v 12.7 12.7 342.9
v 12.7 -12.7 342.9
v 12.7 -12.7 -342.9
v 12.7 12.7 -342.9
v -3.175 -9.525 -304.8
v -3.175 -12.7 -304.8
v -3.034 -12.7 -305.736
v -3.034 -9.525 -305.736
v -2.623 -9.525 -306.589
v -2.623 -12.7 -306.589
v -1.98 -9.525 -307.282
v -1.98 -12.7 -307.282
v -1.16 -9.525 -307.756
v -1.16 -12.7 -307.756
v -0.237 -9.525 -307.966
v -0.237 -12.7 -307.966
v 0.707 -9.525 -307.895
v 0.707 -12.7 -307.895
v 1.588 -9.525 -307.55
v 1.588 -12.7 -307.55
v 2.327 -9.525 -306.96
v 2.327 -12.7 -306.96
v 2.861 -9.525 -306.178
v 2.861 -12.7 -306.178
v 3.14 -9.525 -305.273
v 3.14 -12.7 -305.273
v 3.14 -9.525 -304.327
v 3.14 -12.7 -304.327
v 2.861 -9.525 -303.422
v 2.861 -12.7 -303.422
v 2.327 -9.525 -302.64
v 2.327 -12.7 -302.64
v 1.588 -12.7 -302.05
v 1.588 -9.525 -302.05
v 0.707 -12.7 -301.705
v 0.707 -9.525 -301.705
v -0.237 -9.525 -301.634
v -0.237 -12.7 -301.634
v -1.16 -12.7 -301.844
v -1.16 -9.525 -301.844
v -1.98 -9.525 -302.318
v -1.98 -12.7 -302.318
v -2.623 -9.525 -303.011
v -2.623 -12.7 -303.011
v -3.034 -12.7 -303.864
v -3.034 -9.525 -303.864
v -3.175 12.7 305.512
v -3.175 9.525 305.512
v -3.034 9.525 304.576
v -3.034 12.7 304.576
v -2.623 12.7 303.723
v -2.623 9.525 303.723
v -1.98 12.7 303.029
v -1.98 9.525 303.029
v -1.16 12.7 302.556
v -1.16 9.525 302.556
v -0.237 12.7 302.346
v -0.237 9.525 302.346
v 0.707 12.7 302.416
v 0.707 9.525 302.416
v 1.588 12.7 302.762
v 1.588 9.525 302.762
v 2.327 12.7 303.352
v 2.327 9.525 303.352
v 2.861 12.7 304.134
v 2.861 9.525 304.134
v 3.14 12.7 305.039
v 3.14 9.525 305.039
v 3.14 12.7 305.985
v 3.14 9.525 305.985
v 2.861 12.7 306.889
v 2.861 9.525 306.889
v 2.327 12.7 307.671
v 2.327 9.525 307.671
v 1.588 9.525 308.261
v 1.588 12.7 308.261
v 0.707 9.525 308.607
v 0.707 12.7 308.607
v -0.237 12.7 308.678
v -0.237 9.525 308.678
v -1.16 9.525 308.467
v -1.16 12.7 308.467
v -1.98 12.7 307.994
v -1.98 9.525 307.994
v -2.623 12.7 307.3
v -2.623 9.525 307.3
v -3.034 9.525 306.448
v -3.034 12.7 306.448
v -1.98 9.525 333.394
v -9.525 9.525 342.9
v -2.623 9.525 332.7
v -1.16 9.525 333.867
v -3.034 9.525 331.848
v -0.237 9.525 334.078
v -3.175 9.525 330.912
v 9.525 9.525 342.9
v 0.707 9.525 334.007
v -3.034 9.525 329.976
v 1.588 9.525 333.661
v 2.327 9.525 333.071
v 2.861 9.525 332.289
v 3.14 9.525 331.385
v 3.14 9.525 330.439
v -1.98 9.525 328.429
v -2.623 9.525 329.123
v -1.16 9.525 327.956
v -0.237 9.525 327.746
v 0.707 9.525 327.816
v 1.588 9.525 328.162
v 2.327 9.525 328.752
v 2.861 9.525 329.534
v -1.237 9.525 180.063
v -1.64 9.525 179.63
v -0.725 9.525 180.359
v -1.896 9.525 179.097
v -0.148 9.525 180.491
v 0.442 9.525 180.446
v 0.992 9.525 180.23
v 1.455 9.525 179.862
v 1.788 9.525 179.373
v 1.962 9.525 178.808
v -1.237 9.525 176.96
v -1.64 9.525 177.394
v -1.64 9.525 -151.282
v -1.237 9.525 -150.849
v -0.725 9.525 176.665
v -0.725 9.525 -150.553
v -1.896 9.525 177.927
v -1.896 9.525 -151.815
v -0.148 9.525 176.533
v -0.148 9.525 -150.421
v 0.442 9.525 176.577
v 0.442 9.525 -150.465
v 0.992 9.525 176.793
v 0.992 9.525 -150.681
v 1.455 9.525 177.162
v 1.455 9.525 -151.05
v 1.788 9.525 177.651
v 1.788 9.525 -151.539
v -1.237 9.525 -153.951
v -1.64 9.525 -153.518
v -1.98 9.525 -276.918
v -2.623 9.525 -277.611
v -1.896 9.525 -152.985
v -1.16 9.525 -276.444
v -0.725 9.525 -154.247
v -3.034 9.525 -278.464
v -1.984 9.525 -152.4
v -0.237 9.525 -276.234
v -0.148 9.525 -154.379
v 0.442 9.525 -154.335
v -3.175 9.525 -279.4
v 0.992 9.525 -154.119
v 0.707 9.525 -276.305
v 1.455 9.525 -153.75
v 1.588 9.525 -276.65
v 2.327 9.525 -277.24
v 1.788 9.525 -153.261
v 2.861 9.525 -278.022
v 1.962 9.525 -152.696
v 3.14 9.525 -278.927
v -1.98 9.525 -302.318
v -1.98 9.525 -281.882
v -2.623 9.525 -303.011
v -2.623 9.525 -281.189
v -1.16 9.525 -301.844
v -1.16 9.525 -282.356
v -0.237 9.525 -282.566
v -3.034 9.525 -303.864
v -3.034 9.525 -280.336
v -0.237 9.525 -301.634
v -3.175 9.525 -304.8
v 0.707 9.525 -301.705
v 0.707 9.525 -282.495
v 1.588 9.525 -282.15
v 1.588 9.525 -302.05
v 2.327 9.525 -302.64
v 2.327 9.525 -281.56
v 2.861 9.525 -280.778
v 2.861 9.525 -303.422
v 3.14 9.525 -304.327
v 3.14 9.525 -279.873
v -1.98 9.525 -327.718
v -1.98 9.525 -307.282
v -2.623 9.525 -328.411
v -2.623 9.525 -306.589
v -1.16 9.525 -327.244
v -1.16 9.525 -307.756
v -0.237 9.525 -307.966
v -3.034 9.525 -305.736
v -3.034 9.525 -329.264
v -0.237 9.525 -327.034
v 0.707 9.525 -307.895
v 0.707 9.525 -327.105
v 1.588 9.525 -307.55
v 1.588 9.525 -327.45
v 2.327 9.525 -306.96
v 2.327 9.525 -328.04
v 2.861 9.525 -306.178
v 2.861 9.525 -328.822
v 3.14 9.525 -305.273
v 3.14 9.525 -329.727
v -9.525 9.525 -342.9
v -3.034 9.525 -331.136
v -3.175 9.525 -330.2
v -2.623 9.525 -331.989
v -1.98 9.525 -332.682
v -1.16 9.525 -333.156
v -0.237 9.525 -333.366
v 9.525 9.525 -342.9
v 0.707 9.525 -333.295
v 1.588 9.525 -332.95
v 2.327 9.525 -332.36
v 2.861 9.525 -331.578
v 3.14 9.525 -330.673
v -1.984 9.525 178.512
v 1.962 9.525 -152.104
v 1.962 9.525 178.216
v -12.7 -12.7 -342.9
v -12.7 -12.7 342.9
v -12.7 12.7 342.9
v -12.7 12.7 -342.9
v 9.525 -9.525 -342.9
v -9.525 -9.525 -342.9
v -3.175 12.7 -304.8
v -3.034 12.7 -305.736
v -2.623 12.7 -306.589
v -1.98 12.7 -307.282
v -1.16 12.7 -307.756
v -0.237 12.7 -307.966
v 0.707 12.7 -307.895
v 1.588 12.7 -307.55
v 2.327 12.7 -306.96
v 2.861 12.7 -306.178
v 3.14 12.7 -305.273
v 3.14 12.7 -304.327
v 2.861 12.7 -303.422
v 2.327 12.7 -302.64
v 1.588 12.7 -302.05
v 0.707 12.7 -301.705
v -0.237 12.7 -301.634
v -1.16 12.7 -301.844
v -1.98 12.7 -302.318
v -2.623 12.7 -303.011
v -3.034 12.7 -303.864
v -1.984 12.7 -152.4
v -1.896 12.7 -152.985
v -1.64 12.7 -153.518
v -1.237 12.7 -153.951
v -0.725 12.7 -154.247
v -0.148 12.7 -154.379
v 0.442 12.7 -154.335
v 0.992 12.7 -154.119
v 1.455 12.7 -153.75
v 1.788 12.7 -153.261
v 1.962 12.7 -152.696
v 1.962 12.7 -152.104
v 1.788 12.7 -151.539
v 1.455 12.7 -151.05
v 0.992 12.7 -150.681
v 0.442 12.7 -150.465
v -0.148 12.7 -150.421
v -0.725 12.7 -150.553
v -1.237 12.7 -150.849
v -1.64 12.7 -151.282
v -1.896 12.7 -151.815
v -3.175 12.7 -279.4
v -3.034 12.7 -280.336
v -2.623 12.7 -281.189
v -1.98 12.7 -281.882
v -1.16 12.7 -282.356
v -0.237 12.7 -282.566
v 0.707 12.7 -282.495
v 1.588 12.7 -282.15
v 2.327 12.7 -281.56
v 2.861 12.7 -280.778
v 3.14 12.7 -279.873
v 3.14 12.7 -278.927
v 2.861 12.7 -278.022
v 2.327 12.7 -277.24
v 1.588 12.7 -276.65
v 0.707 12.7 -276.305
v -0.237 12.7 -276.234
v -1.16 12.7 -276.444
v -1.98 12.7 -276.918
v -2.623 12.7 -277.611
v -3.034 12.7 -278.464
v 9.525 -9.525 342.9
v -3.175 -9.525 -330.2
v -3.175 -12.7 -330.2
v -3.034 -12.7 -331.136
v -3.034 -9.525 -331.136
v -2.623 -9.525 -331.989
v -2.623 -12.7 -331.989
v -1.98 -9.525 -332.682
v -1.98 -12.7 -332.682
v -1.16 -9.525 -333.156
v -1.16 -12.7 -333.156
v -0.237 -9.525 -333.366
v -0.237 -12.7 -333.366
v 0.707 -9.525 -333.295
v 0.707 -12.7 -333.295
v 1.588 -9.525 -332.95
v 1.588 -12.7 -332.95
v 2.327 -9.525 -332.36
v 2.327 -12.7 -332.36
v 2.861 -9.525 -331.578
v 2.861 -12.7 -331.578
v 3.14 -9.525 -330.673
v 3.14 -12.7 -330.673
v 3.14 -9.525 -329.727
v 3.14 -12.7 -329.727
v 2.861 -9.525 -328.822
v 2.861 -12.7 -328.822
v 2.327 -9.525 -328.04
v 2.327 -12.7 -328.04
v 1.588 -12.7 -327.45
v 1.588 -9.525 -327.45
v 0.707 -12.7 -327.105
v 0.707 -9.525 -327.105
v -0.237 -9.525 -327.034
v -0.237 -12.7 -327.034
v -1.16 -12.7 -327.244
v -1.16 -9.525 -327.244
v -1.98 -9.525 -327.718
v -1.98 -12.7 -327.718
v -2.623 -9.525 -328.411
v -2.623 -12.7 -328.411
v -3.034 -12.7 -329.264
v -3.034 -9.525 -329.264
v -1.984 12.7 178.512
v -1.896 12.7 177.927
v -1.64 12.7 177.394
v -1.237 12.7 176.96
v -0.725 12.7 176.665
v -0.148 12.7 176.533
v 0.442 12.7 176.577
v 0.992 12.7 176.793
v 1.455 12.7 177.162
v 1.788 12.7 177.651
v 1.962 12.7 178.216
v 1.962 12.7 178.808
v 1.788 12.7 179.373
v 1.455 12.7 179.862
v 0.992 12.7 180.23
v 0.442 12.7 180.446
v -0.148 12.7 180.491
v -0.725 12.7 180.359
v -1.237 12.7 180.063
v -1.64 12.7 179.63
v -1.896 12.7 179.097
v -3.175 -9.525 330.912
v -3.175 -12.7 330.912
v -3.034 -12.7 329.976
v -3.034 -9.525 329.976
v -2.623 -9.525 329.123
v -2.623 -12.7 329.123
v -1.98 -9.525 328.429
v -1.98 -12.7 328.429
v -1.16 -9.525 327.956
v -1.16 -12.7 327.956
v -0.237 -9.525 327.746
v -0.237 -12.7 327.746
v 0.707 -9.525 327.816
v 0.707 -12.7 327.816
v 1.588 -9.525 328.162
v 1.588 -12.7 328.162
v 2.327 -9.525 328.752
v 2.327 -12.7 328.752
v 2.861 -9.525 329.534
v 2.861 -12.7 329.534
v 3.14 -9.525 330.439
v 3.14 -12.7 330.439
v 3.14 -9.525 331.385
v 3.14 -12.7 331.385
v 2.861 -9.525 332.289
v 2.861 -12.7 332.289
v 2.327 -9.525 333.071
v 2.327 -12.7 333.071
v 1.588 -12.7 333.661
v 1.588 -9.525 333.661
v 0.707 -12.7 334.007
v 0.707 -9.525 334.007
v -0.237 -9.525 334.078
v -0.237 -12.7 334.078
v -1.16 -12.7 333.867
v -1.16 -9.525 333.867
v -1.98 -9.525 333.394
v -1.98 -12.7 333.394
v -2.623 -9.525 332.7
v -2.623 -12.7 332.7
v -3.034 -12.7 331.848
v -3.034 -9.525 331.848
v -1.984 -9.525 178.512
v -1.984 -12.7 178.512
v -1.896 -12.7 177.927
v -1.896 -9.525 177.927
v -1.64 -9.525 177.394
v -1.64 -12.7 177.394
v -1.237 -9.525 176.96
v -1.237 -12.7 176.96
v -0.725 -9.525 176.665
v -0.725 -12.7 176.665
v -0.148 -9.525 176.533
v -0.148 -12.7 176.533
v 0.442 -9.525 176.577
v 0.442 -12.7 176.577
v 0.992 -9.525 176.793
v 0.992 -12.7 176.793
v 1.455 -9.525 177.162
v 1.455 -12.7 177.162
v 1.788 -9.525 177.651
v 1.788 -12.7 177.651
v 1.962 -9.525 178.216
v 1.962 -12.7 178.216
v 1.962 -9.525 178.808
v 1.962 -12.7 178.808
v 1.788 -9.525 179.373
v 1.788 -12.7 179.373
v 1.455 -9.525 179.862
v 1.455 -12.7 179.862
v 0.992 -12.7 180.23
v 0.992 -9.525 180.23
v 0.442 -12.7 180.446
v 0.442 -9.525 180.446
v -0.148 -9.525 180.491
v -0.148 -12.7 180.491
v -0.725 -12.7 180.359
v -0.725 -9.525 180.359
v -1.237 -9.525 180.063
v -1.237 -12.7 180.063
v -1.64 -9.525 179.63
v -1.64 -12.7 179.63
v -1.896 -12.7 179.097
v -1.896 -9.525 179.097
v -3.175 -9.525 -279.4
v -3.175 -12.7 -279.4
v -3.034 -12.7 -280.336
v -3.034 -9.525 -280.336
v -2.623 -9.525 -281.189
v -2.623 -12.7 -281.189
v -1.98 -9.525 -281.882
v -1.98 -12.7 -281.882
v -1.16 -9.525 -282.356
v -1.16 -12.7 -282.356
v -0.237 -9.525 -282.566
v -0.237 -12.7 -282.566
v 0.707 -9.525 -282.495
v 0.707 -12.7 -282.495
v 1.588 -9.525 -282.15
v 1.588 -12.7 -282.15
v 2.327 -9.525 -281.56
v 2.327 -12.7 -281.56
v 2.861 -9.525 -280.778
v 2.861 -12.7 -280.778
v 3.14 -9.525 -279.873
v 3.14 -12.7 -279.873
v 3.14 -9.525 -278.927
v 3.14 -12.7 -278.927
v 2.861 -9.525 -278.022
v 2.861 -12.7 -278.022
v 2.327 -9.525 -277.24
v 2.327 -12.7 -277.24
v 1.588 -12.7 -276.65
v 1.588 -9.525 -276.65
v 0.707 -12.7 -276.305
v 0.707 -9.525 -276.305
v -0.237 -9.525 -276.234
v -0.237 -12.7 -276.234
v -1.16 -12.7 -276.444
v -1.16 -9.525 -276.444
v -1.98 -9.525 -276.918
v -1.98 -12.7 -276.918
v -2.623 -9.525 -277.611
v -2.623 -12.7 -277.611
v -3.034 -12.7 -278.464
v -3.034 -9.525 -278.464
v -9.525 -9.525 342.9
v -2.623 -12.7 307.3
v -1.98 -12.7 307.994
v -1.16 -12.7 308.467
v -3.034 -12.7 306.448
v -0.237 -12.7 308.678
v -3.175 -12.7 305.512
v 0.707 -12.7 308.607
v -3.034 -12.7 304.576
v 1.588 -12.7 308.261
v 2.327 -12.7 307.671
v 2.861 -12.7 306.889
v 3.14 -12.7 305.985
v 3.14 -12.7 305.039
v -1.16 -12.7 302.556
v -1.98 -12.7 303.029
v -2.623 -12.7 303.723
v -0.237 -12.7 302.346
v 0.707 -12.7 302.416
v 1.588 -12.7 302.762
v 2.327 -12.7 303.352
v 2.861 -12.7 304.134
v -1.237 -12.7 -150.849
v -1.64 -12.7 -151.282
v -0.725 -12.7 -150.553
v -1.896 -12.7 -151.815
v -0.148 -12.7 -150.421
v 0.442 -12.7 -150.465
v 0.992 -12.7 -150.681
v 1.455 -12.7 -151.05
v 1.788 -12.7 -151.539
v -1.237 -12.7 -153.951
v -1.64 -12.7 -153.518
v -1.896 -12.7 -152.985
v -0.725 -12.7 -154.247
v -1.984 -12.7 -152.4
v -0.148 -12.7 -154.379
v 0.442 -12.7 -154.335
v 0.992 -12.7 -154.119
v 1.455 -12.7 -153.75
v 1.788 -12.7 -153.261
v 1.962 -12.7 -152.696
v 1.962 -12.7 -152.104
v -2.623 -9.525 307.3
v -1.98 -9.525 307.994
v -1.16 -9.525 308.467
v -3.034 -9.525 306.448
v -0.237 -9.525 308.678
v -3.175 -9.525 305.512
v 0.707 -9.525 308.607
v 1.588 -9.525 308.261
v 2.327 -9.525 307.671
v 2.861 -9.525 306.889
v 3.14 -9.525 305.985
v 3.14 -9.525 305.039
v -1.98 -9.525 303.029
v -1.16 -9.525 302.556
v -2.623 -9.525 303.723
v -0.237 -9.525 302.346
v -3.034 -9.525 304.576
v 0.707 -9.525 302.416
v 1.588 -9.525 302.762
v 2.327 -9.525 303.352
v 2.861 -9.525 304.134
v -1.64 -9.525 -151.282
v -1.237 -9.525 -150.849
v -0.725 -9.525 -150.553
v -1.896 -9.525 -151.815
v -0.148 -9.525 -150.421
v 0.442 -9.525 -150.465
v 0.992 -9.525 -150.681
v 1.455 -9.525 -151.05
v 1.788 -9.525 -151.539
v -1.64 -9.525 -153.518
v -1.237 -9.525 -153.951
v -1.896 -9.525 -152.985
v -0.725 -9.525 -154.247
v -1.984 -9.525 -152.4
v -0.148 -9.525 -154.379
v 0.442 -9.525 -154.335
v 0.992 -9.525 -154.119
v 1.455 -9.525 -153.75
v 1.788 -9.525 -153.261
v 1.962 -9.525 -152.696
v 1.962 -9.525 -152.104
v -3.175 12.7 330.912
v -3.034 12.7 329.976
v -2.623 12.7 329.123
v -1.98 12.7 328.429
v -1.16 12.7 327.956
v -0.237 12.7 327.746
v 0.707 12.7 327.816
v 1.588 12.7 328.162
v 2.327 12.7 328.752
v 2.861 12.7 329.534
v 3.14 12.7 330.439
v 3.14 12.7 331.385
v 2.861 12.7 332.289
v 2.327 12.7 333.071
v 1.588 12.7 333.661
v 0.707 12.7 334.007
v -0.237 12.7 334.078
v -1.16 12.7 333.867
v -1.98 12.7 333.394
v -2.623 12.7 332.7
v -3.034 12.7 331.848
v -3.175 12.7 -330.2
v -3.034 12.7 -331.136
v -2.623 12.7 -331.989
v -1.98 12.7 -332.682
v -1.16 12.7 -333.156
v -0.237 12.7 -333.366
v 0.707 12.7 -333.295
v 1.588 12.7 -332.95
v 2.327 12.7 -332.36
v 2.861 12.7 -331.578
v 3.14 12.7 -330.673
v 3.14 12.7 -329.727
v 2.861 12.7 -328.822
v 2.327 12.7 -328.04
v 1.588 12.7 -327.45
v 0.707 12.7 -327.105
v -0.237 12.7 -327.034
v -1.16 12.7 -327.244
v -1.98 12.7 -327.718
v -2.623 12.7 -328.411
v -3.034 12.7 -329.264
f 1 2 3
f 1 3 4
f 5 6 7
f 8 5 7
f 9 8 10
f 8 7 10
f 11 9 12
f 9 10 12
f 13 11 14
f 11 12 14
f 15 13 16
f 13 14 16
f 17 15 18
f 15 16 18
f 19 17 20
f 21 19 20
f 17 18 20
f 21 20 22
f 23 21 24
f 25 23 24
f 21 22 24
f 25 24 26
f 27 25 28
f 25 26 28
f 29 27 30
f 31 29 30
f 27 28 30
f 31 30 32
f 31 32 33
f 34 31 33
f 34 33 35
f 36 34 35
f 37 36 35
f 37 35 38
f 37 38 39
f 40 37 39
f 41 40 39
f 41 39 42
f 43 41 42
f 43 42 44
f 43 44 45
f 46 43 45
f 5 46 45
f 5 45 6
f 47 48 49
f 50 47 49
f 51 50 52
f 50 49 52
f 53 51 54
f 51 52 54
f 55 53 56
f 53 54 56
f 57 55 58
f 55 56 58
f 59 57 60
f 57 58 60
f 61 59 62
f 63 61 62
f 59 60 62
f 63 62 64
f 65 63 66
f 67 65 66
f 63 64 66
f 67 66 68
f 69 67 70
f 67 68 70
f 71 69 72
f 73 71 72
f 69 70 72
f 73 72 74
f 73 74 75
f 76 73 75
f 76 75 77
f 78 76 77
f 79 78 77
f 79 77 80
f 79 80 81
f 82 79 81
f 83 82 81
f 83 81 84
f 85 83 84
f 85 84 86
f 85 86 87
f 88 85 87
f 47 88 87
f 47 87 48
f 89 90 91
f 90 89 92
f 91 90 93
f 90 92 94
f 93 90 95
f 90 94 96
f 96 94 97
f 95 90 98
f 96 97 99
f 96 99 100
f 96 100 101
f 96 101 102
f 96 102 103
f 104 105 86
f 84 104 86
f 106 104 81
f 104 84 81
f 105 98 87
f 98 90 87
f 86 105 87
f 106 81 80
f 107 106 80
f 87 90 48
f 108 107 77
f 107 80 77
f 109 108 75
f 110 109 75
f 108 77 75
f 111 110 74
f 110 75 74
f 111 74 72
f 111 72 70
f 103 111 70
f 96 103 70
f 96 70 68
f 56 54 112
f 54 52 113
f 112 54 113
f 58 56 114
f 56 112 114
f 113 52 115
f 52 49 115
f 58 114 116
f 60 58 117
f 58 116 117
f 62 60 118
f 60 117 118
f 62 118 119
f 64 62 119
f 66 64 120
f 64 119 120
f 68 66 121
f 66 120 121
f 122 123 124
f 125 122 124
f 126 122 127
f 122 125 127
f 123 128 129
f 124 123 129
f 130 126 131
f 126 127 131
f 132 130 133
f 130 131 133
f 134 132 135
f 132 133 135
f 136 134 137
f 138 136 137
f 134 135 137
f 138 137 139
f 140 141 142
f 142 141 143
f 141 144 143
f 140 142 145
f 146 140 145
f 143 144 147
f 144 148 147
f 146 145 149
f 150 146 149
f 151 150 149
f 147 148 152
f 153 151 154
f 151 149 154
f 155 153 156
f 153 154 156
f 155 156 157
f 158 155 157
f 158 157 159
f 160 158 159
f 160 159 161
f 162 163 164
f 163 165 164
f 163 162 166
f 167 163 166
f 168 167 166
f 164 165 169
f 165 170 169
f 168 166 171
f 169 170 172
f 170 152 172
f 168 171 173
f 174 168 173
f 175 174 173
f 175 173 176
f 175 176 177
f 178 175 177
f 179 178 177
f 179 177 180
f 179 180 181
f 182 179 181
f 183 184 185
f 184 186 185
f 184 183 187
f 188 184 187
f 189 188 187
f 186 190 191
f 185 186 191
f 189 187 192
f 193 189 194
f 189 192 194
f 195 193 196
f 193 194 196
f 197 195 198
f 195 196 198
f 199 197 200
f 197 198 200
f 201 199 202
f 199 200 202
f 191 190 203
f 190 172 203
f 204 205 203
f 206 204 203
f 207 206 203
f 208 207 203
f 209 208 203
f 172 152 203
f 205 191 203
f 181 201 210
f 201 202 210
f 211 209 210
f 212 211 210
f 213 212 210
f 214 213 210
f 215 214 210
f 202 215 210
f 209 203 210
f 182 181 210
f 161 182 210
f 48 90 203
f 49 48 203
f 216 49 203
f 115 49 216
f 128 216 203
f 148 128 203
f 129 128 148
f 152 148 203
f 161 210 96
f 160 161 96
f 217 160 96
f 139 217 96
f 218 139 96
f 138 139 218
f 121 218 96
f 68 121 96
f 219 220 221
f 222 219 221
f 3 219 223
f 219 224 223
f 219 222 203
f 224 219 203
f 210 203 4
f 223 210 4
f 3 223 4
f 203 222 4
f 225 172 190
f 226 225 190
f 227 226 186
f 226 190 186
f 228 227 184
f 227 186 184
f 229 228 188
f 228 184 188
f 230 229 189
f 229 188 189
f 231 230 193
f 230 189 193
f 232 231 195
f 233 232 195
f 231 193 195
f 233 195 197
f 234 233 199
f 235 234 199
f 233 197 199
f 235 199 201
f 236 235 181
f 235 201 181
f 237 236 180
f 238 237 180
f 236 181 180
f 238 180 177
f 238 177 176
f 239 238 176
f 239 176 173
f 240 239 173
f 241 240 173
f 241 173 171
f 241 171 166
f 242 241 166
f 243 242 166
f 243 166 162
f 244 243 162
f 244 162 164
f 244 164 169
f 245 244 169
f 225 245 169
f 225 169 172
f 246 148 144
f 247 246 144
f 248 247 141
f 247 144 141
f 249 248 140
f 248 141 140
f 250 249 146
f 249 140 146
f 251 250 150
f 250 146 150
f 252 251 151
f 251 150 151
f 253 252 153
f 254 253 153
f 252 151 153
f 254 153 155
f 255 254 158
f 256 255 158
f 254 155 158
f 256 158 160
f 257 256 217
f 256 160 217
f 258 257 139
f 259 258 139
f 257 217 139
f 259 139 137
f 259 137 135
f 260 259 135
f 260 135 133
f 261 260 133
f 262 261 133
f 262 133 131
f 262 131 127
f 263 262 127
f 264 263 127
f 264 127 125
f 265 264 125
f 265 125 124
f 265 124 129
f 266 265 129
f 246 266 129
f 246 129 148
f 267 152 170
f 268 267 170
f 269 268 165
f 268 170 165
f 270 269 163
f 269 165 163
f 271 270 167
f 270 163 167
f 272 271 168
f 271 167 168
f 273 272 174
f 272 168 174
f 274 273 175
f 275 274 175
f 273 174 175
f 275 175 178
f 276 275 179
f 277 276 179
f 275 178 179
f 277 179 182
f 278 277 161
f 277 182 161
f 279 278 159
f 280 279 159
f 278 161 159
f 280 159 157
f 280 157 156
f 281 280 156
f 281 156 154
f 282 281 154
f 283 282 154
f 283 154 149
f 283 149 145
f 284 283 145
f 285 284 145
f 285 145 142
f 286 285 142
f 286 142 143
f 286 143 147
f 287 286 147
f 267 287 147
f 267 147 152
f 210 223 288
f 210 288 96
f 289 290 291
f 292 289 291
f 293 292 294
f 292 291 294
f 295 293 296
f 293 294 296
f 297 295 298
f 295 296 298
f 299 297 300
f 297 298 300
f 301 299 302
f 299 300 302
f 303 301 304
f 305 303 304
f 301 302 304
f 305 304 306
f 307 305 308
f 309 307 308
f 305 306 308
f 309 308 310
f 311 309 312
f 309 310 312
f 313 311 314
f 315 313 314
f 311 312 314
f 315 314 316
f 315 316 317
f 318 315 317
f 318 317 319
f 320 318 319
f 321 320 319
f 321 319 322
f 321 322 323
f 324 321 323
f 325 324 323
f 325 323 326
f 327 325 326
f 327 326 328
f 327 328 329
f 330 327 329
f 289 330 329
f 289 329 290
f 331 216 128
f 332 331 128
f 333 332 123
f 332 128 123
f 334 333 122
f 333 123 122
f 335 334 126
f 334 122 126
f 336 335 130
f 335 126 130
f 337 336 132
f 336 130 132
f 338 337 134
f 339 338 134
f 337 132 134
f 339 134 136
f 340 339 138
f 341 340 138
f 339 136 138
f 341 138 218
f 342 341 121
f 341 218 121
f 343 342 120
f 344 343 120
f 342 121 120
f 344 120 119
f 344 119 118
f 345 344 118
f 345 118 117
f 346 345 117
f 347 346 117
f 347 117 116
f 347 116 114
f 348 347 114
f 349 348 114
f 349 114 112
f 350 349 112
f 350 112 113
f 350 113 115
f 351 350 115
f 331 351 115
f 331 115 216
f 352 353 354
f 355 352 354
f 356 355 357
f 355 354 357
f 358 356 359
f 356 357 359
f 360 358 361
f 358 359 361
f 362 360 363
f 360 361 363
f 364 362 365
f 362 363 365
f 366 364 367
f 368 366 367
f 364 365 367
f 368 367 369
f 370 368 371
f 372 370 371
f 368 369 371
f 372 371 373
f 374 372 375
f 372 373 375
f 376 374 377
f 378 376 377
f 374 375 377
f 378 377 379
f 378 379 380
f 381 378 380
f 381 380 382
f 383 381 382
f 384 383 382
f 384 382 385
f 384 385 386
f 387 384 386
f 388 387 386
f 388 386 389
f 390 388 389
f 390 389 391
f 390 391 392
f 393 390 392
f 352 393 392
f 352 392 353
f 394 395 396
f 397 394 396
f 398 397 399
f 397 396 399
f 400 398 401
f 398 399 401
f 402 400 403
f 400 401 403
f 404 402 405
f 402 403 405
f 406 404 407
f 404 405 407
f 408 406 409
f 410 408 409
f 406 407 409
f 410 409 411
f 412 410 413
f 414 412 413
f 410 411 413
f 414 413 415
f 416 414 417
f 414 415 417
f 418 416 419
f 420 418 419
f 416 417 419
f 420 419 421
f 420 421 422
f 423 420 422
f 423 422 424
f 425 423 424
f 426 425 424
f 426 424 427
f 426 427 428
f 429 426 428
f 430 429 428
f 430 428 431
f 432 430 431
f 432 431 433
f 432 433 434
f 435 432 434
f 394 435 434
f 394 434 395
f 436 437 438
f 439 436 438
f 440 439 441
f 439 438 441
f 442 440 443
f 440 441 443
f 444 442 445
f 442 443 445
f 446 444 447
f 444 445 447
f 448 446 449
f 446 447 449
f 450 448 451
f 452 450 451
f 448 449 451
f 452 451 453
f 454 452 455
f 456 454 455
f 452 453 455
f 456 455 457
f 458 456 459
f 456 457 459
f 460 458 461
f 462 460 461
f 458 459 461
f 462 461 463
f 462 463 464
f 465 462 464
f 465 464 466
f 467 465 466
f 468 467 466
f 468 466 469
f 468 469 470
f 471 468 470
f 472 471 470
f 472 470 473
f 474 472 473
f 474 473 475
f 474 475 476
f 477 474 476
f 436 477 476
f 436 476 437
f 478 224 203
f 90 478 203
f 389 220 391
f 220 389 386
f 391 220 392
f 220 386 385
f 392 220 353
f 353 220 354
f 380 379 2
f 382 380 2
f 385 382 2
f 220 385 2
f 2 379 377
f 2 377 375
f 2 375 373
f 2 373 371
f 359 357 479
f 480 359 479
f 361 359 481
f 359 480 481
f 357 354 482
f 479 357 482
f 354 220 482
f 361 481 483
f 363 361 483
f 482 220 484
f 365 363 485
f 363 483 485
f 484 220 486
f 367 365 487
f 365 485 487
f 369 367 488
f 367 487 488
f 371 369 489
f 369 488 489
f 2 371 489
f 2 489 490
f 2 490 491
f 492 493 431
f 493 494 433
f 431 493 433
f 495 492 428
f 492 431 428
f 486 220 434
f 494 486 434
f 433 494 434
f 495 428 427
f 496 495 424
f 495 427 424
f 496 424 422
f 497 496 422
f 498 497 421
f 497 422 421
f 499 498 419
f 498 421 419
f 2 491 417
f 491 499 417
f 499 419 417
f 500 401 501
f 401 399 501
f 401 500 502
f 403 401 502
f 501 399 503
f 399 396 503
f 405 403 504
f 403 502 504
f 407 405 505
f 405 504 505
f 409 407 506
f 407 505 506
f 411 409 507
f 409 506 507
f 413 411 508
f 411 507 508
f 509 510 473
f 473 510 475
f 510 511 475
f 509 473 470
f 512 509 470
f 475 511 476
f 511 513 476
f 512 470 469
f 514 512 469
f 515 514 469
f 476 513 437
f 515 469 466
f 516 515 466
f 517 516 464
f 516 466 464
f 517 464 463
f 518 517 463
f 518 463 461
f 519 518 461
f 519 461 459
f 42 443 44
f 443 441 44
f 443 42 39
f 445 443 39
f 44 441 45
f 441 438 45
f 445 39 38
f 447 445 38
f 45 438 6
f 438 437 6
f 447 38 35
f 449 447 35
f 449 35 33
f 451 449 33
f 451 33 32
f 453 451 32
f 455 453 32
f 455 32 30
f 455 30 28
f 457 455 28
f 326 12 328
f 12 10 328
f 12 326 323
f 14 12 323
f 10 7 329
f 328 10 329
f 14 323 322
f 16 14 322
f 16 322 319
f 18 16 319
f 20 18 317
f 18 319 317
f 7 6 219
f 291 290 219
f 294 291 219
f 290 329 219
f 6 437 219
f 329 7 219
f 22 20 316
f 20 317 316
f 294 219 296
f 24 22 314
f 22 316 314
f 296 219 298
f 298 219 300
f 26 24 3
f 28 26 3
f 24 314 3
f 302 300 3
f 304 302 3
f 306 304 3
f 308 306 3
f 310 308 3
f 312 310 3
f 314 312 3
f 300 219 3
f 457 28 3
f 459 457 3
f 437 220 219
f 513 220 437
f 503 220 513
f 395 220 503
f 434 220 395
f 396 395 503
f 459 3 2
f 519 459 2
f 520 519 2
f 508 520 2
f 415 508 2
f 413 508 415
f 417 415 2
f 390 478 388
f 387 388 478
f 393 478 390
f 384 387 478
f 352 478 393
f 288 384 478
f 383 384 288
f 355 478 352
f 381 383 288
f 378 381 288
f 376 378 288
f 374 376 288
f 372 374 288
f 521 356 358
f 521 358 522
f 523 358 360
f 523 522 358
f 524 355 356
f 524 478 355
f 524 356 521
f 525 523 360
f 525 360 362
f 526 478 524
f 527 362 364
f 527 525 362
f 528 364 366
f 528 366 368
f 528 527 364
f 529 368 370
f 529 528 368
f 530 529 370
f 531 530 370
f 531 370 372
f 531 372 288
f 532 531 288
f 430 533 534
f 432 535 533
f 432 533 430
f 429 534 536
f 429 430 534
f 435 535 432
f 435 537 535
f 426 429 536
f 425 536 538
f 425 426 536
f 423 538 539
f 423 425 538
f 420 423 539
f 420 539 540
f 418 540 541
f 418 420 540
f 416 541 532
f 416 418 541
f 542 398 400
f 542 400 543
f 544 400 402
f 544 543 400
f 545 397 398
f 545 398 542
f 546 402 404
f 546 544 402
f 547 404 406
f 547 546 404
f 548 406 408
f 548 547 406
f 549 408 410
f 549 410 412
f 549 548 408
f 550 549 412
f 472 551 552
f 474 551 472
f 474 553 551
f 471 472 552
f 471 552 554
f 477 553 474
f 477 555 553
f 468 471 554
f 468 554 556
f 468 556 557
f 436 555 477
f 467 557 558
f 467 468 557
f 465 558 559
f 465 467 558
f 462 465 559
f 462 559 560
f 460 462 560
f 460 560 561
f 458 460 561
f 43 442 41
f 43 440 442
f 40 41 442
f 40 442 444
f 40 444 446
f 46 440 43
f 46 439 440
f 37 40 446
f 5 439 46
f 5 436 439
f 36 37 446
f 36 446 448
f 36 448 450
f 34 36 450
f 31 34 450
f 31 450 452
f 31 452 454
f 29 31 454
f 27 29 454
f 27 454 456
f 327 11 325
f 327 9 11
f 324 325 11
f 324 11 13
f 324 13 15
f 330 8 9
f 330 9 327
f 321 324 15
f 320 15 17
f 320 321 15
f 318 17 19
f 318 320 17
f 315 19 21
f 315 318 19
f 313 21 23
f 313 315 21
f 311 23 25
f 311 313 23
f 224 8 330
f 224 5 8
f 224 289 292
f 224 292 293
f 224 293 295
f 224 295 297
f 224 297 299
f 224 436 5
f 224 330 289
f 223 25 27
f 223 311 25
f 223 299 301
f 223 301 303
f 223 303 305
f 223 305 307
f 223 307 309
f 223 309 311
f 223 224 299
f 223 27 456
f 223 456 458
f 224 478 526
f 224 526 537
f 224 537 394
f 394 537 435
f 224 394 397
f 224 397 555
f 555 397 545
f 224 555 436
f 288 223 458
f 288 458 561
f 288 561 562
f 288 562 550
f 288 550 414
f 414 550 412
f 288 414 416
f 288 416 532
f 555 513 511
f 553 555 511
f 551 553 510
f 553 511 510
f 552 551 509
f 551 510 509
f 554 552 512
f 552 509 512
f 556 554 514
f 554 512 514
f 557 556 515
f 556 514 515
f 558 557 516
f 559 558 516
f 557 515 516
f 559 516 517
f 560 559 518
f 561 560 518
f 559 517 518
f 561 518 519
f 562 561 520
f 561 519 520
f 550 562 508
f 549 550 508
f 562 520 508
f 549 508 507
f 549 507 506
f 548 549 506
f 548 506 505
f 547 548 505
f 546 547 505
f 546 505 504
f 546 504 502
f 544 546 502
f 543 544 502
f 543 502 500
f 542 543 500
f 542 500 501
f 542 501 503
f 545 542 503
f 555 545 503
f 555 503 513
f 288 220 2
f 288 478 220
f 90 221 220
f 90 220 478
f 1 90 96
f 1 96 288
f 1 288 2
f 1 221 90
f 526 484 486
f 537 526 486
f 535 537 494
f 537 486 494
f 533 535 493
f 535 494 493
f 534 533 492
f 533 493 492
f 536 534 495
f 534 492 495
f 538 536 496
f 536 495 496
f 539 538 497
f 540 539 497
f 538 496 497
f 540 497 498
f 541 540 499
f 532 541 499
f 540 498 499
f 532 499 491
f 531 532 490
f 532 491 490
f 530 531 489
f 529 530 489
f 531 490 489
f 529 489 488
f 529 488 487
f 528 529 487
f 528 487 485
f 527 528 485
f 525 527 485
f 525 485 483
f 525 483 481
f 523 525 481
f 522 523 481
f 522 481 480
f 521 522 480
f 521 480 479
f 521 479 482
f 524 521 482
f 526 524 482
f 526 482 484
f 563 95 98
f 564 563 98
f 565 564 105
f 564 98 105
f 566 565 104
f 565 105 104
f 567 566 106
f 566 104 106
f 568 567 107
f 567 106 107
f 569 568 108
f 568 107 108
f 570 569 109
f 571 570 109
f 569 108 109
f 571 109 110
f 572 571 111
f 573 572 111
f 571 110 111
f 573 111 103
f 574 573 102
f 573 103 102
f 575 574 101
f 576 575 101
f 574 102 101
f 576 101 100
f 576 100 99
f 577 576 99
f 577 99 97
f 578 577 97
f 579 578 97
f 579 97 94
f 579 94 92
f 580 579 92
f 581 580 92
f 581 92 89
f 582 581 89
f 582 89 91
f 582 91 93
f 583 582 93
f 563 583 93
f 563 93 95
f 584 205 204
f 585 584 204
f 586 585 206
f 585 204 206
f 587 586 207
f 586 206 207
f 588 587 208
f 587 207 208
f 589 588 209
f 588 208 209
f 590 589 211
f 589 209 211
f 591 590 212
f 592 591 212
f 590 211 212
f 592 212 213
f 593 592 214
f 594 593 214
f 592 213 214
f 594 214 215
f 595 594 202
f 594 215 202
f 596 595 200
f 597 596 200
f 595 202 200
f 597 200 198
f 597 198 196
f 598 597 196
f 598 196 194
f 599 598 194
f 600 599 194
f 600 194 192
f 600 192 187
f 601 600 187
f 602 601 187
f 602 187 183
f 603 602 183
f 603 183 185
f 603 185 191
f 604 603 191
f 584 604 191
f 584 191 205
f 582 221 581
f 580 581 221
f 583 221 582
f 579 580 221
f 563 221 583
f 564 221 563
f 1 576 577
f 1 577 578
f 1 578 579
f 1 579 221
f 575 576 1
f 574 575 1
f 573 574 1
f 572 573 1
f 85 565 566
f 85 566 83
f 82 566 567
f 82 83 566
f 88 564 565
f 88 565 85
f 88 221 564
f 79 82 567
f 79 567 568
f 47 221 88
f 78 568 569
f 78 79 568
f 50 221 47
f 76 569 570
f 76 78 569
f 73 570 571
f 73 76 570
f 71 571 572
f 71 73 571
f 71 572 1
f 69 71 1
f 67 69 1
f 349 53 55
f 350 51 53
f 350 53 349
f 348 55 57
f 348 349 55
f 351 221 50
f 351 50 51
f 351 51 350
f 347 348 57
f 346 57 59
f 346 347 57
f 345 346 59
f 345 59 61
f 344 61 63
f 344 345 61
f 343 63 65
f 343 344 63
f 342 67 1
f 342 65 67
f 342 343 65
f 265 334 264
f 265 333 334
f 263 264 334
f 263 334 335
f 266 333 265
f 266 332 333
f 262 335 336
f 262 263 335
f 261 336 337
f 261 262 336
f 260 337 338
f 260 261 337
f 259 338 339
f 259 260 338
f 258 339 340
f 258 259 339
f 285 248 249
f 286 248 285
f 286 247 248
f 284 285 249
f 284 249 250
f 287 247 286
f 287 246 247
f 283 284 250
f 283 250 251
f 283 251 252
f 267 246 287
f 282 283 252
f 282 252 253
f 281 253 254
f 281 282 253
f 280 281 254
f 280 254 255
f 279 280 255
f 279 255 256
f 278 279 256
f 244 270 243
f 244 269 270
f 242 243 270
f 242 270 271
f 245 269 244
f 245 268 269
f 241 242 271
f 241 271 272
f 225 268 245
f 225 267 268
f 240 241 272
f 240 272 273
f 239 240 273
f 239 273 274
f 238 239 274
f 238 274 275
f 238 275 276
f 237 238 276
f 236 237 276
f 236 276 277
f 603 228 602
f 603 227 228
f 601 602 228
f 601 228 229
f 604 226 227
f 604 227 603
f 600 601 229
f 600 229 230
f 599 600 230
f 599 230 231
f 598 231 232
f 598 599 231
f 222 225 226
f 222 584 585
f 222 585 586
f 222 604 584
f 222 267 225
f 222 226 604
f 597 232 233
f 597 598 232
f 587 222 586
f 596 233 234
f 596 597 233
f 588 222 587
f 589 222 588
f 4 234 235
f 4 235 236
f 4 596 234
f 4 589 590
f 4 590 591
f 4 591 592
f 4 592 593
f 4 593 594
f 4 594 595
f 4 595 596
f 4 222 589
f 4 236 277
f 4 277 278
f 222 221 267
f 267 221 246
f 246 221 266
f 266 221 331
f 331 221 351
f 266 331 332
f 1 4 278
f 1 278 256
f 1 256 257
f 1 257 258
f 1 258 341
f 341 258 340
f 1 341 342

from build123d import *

# Parameters (mm, degrees)
BOSS_EXTRUDE1_DEPTH             = 342.9
BOSS_EXTRUDE1_DEPTH_BACK        = 342.9
SKETCH3_W                       = 25.4
SKETCH3_H                       = 25.4
SKETCH3_W_2                     = 19.05
SKETCH3_H_2                     = 19.05
F_5_32_0_15625_DIAMETER_HOLE1_D = 3.96875
F_1_4_0_25_DIAMETER_HOLE1_D     = 6.35
F_1_4_0_25_DIAMETER_HOLE2_D     = 6.35


with BuildPart() as part:
    # Sketch3 → Boss-Extrude1 (new, two sides: drawn at the far end of the back side and taken through both)
    with BuildSketch(Plane.XY.offset(-BOSS_EXTRUDE1_DEPTH_BACK)):
        Rectangle(SKETCH3_W, SKETCH3_H)
        Rectangle(SKETCH3_W_2, SKETCH3_H_2, mode=Mode.SUBTRACT)
    extrude(amount=BOSS_EXTRUDE1_DEPTH + BOSS_EXTRUDE1_DEPTH_BACK)

    # 5/32 (0.15625) Diameter Hole1 (through all)
    with Locations(Plane(origin=(0, 12.7, 0), x_dir=(1, 0, 0), z_dir=(0, 1, 0))):
        with Locations((0, 152.4), (0, -178.5118096)):
            Hole(F_5_32_0_15625_DIAMETER_HOLE1_D / 2)

    # 1/4 (0.25) Diameter Hole1 (through all)
    with Locations(Plane(origin=(0, 12.7, 0), x_dir=(1, 0, 0), z_dir=(0, 1, 0))):
        with Locations((0, 330.2), (0, 304.8), (0, 279.4)):
            Hole(F_1_4_0_25_DIAMETER_HOLE1_D / 2)

    # 1/4 (0.25) Diameter Hole2 (through all)
    with Locations(Plane(origin=(0, 12.7, 0), x_dir=(1, 0, 0), z_dir=(0, 1, 0))):
        with Locations((0, -330.911799988), (0, -305.511799988)):
            Hole(F_1_4_0_25_DIAMETER_HOLE2_D / 2)


solid = part.part
